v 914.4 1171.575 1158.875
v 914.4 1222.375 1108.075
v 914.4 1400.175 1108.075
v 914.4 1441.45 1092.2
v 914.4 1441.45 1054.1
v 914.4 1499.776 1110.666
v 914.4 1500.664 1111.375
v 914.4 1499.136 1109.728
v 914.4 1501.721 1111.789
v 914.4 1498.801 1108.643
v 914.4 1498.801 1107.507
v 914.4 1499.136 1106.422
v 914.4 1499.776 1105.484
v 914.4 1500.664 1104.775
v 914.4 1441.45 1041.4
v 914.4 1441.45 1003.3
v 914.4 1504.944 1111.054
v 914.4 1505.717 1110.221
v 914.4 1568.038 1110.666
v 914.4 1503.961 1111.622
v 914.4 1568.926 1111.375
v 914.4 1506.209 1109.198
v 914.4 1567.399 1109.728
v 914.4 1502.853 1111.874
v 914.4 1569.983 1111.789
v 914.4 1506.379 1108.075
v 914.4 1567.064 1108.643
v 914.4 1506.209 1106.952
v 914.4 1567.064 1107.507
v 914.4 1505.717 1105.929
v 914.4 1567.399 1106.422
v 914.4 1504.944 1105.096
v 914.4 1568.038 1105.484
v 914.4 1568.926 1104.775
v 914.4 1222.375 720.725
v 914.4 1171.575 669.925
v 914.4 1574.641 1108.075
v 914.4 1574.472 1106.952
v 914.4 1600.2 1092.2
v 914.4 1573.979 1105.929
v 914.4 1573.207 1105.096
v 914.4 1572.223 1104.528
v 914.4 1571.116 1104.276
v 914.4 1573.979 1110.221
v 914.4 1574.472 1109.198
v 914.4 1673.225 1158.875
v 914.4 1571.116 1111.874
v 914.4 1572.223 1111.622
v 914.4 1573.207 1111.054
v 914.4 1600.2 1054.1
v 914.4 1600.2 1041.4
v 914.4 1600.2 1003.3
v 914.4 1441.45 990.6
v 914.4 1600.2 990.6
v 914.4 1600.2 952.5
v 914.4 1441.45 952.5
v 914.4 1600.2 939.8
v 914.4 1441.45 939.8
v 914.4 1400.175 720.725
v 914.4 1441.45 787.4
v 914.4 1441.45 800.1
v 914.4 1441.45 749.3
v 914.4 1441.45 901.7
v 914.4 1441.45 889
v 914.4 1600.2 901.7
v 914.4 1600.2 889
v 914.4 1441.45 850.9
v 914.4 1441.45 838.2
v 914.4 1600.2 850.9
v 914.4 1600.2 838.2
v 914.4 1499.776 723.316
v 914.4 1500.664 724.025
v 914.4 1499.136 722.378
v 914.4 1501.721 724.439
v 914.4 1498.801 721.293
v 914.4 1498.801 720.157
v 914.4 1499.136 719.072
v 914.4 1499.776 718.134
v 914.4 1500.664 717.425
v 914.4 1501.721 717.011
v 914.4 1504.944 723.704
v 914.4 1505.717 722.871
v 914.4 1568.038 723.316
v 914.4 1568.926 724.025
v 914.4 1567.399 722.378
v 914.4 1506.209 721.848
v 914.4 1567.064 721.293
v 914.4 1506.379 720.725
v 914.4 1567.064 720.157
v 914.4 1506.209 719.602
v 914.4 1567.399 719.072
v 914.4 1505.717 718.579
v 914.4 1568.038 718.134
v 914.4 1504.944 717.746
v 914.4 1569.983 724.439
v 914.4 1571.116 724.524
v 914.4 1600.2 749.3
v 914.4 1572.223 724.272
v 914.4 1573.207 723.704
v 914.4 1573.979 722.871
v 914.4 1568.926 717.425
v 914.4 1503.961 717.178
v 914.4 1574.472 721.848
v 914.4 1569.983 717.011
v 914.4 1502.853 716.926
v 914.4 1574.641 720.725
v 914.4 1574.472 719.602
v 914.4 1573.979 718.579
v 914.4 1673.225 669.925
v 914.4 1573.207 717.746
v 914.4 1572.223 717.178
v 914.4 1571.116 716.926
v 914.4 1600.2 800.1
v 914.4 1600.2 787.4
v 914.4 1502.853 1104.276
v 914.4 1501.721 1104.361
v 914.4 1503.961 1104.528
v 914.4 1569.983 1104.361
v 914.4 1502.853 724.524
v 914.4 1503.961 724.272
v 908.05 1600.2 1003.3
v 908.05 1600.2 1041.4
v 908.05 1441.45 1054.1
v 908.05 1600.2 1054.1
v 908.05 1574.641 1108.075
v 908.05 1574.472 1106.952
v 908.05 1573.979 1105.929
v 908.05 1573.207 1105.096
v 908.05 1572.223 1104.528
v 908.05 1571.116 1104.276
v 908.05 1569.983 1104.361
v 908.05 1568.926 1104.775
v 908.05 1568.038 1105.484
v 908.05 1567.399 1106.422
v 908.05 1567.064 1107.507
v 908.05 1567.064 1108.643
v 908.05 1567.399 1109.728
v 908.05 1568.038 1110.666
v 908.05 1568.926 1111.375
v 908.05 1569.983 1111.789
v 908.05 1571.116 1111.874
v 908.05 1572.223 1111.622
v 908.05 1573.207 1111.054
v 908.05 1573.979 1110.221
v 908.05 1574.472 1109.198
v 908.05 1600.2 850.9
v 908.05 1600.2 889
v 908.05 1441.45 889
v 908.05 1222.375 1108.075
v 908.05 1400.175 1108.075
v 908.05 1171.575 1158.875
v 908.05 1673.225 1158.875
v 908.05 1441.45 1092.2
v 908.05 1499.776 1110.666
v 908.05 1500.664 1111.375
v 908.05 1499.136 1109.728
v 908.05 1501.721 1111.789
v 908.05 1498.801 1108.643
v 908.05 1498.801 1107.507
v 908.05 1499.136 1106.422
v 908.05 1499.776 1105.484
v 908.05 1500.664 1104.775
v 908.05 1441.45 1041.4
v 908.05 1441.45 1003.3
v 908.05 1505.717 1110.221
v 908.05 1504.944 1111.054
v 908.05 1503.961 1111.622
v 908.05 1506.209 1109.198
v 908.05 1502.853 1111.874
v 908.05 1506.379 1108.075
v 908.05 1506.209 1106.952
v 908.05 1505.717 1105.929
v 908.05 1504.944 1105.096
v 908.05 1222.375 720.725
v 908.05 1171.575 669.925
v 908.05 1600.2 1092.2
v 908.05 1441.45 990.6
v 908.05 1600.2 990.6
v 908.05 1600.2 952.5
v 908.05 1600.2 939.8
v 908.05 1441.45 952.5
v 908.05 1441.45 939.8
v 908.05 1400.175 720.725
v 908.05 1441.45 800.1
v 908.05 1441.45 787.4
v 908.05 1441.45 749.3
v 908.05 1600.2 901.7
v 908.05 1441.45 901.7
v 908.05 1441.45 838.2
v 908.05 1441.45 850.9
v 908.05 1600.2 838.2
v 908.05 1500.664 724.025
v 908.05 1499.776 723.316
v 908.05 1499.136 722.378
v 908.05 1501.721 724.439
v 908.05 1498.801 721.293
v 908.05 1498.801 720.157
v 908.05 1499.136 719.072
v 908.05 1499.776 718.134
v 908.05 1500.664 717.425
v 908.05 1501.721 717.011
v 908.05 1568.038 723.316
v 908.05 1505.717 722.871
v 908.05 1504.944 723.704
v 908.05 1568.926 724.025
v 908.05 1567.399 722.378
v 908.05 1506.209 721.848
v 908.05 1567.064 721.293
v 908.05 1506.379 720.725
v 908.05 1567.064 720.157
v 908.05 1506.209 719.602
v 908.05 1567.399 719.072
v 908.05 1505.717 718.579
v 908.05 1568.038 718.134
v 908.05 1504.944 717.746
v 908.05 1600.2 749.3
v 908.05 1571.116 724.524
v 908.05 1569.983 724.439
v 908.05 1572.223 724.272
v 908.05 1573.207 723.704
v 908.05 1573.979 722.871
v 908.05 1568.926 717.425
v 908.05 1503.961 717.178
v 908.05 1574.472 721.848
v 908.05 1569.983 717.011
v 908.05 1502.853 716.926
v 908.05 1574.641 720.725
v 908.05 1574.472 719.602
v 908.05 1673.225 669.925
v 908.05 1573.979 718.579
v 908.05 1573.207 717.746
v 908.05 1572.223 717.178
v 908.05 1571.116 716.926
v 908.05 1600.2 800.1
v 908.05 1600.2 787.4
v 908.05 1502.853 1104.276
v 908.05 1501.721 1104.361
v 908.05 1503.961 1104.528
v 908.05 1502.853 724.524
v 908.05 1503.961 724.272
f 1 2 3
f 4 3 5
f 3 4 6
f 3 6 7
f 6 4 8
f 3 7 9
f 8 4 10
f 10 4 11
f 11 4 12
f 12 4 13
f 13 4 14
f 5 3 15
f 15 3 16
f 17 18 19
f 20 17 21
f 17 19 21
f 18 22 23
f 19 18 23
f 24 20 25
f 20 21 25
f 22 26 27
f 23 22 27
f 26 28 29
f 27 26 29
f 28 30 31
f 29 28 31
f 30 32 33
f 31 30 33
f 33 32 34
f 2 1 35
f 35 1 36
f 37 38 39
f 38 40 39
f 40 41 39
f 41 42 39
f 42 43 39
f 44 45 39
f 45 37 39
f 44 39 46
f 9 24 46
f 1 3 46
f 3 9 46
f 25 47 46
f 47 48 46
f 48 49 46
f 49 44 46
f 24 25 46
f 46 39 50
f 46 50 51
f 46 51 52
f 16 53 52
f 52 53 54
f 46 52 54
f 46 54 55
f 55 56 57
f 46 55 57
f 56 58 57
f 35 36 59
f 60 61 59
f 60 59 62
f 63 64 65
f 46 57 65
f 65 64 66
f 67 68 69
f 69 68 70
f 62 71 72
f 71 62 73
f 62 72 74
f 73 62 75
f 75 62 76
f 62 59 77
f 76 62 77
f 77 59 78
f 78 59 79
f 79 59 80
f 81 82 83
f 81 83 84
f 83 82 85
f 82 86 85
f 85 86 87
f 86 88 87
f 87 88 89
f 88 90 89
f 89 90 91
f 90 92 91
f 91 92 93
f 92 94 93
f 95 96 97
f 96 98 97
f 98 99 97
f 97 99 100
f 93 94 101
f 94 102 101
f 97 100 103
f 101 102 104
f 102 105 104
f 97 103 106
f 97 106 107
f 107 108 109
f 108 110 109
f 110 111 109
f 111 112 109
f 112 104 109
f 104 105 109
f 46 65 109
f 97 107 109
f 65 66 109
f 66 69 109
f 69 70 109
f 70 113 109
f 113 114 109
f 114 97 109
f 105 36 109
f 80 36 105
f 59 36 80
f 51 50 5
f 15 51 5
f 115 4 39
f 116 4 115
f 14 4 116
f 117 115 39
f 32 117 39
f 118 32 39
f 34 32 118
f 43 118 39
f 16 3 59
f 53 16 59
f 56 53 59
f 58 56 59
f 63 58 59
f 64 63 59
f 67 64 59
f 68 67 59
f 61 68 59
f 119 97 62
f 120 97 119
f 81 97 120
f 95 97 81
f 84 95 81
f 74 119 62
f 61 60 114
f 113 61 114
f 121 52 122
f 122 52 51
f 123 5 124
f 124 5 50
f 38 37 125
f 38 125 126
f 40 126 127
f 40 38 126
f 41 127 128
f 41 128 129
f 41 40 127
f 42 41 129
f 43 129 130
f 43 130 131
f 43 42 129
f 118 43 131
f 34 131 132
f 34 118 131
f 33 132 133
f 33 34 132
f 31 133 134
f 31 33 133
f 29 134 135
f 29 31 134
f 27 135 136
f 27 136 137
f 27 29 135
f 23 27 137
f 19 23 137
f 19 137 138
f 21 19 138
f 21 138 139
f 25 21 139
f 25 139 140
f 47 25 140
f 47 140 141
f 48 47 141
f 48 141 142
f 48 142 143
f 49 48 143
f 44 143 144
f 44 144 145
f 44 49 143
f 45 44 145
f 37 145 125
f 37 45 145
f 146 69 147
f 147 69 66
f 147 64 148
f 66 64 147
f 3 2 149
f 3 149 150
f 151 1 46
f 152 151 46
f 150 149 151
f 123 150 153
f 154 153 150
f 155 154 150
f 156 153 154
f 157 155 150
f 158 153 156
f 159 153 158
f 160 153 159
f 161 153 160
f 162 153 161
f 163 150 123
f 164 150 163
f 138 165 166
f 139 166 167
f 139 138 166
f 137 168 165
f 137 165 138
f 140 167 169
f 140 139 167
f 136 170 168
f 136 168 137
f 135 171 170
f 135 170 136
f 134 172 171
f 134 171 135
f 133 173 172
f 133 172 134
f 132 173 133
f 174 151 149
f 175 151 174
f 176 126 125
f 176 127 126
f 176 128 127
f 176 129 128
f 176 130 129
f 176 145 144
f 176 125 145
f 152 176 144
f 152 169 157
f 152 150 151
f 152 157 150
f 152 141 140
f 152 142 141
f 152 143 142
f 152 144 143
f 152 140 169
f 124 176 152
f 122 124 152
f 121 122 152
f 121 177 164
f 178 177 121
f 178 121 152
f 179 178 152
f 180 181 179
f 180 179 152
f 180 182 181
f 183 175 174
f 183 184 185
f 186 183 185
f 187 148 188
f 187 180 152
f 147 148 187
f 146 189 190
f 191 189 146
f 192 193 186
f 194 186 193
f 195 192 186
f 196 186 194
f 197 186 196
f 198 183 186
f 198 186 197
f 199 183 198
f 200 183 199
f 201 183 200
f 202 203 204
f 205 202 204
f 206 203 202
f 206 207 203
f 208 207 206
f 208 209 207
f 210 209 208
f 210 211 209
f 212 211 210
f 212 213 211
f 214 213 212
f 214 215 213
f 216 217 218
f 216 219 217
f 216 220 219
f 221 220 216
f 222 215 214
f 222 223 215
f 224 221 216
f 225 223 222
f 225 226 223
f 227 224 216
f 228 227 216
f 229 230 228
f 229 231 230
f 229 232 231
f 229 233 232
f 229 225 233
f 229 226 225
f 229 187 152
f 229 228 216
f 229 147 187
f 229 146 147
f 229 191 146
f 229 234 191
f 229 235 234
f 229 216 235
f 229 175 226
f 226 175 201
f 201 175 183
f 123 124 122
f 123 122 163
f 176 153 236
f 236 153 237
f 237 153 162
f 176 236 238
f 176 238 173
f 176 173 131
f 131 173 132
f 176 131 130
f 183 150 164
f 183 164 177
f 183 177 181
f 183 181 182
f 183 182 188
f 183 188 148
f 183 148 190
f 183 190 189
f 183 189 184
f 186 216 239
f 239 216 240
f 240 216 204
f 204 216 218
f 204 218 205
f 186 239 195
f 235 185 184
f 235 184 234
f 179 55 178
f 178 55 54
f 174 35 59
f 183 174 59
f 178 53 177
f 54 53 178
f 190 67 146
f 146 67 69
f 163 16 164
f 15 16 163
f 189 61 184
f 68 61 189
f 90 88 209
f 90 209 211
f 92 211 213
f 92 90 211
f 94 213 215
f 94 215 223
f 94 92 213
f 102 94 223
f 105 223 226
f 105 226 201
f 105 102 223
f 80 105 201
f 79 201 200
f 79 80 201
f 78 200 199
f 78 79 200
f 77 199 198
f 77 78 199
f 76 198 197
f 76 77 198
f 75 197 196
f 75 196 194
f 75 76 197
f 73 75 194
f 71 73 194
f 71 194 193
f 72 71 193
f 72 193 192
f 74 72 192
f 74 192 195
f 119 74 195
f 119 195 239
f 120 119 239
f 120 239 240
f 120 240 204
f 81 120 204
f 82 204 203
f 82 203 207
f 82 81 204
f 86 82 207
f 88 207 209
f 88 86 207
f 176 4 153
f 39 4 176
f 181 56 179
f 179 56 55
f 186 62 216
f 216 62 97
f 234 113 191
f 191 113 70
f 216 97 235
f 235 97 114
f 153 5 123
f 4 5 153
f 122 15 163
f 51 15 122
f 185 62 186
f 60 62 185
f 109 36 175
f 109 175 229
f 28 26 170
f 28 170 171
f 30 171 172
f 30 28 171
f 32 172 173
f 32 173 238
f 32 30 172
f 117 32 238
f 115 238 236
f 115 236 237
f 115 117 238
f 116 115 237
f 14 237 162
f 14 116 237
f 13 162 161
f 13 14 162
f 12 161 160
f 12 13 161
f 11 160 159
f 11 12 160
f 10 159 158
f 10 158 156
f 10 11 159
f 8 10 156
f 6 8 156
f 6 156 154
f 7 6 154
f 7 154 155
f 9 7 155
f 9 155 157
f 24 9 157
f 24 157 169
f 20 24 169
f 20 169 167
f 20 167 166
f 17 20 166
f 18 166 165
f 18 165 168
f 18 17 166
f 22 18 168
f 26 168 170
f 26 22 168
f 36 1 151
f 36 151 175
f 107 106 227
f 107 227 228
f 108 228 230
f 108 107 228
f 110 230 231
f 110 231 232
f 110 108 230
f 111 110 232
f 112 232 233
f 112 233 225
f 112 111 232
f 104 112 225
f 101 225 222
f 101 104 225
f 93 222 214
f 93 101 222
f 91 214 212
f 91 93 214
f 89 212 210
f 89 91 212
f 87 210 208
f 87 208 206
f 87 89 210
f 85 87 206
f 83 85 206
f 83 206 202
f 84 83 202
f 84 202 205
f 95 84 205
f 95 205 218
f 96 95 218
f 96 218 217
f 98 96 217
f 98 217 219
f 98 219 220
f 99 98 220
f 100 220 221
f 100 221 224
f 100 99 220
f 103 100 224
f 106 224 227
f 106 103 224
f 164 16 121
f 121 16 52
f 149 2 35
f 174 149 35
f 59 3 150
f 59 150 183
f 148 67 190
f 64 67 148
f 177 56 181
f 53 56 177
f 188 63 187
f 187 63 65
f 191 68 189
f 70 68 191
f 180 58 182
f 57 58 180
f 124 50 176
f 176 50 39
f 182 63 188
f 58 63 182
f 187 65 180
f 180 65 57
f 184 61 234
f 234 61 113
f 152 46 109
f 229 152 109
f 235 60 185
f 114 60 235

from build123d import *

# Parameters (mm, degrees)
SKETCH001_W         = 501.65
SKETCH001_H         = 488.95
SKETCH001_R         = 3.81
SKETCH001_W_2       = 177.8
SKETCH001_H_2       = 387.35
PAD007_DEPTH        = 6.35
SKETCH005_W         = 158.75
SKETCH005_H         = 38.1
POCKET_DEPTH        = 6.35
LINEARPATTERN_COUNT = 7
LINEARPATTERN_PITCH = 50.8


with BuildPart() as part:
    # Sketch001 → Pad007 (new body)
    with BuildSketch(Plane(origin=(914.4, 1422.4, 914.4), x_dir=(0, 1, 0), z_dir=(-1, 0, 0))):
        Rectangle(SKETCH001_W, SKETCH001_H)
        with Locations((80.16875, 193.675)):
            Circle(SKETCH001_R, mode=Mode.SUBTRACT)
        with Locations((148.43125, 193.675)):
            Circle(SKETCH001_R, mode=Mode.SUBTRACT)
        with Locations((80.16875, -193.675)):
            Circle(SKETCH001_R, mode=Mode.SUBTRACT)
        with Locations((148.43125, -193.675)):
            Circle(SKETCH001_R, mode=Mode.SUBTRACT)
        with Locations((-111.125, 0)):
            Rectangle(SKETCH001_W_2, SKETCH001_H_2, mode=Mode.SUBTRACT)
    extrude(amount=PAD007_DEPTH)

    # Sketch005 → Pocket (cut)
    with BuildSketch(Plane(origin=(914.4, 1422.4, 914.4), x_dir=(0, 1, 0), z_dir=(1, 0, 0))):
        with Locations((98.425, 158.75)):
            Rectangle(SKETCH005_W, SKETCH005_H)
    pocket = extrude(amount=-POCKET_DEPTH, mode=Mode.SUBTRACT)

    # LinearPattern: Pocket ×7
    with Locations(*[(0, 0, -i * LINEARPATTERN_PITCH) for i in range(1, LINEARPATTERN_COUNT)]):
        add(pocket, mode=Mode.SUBTRACT)


solid = part.part
